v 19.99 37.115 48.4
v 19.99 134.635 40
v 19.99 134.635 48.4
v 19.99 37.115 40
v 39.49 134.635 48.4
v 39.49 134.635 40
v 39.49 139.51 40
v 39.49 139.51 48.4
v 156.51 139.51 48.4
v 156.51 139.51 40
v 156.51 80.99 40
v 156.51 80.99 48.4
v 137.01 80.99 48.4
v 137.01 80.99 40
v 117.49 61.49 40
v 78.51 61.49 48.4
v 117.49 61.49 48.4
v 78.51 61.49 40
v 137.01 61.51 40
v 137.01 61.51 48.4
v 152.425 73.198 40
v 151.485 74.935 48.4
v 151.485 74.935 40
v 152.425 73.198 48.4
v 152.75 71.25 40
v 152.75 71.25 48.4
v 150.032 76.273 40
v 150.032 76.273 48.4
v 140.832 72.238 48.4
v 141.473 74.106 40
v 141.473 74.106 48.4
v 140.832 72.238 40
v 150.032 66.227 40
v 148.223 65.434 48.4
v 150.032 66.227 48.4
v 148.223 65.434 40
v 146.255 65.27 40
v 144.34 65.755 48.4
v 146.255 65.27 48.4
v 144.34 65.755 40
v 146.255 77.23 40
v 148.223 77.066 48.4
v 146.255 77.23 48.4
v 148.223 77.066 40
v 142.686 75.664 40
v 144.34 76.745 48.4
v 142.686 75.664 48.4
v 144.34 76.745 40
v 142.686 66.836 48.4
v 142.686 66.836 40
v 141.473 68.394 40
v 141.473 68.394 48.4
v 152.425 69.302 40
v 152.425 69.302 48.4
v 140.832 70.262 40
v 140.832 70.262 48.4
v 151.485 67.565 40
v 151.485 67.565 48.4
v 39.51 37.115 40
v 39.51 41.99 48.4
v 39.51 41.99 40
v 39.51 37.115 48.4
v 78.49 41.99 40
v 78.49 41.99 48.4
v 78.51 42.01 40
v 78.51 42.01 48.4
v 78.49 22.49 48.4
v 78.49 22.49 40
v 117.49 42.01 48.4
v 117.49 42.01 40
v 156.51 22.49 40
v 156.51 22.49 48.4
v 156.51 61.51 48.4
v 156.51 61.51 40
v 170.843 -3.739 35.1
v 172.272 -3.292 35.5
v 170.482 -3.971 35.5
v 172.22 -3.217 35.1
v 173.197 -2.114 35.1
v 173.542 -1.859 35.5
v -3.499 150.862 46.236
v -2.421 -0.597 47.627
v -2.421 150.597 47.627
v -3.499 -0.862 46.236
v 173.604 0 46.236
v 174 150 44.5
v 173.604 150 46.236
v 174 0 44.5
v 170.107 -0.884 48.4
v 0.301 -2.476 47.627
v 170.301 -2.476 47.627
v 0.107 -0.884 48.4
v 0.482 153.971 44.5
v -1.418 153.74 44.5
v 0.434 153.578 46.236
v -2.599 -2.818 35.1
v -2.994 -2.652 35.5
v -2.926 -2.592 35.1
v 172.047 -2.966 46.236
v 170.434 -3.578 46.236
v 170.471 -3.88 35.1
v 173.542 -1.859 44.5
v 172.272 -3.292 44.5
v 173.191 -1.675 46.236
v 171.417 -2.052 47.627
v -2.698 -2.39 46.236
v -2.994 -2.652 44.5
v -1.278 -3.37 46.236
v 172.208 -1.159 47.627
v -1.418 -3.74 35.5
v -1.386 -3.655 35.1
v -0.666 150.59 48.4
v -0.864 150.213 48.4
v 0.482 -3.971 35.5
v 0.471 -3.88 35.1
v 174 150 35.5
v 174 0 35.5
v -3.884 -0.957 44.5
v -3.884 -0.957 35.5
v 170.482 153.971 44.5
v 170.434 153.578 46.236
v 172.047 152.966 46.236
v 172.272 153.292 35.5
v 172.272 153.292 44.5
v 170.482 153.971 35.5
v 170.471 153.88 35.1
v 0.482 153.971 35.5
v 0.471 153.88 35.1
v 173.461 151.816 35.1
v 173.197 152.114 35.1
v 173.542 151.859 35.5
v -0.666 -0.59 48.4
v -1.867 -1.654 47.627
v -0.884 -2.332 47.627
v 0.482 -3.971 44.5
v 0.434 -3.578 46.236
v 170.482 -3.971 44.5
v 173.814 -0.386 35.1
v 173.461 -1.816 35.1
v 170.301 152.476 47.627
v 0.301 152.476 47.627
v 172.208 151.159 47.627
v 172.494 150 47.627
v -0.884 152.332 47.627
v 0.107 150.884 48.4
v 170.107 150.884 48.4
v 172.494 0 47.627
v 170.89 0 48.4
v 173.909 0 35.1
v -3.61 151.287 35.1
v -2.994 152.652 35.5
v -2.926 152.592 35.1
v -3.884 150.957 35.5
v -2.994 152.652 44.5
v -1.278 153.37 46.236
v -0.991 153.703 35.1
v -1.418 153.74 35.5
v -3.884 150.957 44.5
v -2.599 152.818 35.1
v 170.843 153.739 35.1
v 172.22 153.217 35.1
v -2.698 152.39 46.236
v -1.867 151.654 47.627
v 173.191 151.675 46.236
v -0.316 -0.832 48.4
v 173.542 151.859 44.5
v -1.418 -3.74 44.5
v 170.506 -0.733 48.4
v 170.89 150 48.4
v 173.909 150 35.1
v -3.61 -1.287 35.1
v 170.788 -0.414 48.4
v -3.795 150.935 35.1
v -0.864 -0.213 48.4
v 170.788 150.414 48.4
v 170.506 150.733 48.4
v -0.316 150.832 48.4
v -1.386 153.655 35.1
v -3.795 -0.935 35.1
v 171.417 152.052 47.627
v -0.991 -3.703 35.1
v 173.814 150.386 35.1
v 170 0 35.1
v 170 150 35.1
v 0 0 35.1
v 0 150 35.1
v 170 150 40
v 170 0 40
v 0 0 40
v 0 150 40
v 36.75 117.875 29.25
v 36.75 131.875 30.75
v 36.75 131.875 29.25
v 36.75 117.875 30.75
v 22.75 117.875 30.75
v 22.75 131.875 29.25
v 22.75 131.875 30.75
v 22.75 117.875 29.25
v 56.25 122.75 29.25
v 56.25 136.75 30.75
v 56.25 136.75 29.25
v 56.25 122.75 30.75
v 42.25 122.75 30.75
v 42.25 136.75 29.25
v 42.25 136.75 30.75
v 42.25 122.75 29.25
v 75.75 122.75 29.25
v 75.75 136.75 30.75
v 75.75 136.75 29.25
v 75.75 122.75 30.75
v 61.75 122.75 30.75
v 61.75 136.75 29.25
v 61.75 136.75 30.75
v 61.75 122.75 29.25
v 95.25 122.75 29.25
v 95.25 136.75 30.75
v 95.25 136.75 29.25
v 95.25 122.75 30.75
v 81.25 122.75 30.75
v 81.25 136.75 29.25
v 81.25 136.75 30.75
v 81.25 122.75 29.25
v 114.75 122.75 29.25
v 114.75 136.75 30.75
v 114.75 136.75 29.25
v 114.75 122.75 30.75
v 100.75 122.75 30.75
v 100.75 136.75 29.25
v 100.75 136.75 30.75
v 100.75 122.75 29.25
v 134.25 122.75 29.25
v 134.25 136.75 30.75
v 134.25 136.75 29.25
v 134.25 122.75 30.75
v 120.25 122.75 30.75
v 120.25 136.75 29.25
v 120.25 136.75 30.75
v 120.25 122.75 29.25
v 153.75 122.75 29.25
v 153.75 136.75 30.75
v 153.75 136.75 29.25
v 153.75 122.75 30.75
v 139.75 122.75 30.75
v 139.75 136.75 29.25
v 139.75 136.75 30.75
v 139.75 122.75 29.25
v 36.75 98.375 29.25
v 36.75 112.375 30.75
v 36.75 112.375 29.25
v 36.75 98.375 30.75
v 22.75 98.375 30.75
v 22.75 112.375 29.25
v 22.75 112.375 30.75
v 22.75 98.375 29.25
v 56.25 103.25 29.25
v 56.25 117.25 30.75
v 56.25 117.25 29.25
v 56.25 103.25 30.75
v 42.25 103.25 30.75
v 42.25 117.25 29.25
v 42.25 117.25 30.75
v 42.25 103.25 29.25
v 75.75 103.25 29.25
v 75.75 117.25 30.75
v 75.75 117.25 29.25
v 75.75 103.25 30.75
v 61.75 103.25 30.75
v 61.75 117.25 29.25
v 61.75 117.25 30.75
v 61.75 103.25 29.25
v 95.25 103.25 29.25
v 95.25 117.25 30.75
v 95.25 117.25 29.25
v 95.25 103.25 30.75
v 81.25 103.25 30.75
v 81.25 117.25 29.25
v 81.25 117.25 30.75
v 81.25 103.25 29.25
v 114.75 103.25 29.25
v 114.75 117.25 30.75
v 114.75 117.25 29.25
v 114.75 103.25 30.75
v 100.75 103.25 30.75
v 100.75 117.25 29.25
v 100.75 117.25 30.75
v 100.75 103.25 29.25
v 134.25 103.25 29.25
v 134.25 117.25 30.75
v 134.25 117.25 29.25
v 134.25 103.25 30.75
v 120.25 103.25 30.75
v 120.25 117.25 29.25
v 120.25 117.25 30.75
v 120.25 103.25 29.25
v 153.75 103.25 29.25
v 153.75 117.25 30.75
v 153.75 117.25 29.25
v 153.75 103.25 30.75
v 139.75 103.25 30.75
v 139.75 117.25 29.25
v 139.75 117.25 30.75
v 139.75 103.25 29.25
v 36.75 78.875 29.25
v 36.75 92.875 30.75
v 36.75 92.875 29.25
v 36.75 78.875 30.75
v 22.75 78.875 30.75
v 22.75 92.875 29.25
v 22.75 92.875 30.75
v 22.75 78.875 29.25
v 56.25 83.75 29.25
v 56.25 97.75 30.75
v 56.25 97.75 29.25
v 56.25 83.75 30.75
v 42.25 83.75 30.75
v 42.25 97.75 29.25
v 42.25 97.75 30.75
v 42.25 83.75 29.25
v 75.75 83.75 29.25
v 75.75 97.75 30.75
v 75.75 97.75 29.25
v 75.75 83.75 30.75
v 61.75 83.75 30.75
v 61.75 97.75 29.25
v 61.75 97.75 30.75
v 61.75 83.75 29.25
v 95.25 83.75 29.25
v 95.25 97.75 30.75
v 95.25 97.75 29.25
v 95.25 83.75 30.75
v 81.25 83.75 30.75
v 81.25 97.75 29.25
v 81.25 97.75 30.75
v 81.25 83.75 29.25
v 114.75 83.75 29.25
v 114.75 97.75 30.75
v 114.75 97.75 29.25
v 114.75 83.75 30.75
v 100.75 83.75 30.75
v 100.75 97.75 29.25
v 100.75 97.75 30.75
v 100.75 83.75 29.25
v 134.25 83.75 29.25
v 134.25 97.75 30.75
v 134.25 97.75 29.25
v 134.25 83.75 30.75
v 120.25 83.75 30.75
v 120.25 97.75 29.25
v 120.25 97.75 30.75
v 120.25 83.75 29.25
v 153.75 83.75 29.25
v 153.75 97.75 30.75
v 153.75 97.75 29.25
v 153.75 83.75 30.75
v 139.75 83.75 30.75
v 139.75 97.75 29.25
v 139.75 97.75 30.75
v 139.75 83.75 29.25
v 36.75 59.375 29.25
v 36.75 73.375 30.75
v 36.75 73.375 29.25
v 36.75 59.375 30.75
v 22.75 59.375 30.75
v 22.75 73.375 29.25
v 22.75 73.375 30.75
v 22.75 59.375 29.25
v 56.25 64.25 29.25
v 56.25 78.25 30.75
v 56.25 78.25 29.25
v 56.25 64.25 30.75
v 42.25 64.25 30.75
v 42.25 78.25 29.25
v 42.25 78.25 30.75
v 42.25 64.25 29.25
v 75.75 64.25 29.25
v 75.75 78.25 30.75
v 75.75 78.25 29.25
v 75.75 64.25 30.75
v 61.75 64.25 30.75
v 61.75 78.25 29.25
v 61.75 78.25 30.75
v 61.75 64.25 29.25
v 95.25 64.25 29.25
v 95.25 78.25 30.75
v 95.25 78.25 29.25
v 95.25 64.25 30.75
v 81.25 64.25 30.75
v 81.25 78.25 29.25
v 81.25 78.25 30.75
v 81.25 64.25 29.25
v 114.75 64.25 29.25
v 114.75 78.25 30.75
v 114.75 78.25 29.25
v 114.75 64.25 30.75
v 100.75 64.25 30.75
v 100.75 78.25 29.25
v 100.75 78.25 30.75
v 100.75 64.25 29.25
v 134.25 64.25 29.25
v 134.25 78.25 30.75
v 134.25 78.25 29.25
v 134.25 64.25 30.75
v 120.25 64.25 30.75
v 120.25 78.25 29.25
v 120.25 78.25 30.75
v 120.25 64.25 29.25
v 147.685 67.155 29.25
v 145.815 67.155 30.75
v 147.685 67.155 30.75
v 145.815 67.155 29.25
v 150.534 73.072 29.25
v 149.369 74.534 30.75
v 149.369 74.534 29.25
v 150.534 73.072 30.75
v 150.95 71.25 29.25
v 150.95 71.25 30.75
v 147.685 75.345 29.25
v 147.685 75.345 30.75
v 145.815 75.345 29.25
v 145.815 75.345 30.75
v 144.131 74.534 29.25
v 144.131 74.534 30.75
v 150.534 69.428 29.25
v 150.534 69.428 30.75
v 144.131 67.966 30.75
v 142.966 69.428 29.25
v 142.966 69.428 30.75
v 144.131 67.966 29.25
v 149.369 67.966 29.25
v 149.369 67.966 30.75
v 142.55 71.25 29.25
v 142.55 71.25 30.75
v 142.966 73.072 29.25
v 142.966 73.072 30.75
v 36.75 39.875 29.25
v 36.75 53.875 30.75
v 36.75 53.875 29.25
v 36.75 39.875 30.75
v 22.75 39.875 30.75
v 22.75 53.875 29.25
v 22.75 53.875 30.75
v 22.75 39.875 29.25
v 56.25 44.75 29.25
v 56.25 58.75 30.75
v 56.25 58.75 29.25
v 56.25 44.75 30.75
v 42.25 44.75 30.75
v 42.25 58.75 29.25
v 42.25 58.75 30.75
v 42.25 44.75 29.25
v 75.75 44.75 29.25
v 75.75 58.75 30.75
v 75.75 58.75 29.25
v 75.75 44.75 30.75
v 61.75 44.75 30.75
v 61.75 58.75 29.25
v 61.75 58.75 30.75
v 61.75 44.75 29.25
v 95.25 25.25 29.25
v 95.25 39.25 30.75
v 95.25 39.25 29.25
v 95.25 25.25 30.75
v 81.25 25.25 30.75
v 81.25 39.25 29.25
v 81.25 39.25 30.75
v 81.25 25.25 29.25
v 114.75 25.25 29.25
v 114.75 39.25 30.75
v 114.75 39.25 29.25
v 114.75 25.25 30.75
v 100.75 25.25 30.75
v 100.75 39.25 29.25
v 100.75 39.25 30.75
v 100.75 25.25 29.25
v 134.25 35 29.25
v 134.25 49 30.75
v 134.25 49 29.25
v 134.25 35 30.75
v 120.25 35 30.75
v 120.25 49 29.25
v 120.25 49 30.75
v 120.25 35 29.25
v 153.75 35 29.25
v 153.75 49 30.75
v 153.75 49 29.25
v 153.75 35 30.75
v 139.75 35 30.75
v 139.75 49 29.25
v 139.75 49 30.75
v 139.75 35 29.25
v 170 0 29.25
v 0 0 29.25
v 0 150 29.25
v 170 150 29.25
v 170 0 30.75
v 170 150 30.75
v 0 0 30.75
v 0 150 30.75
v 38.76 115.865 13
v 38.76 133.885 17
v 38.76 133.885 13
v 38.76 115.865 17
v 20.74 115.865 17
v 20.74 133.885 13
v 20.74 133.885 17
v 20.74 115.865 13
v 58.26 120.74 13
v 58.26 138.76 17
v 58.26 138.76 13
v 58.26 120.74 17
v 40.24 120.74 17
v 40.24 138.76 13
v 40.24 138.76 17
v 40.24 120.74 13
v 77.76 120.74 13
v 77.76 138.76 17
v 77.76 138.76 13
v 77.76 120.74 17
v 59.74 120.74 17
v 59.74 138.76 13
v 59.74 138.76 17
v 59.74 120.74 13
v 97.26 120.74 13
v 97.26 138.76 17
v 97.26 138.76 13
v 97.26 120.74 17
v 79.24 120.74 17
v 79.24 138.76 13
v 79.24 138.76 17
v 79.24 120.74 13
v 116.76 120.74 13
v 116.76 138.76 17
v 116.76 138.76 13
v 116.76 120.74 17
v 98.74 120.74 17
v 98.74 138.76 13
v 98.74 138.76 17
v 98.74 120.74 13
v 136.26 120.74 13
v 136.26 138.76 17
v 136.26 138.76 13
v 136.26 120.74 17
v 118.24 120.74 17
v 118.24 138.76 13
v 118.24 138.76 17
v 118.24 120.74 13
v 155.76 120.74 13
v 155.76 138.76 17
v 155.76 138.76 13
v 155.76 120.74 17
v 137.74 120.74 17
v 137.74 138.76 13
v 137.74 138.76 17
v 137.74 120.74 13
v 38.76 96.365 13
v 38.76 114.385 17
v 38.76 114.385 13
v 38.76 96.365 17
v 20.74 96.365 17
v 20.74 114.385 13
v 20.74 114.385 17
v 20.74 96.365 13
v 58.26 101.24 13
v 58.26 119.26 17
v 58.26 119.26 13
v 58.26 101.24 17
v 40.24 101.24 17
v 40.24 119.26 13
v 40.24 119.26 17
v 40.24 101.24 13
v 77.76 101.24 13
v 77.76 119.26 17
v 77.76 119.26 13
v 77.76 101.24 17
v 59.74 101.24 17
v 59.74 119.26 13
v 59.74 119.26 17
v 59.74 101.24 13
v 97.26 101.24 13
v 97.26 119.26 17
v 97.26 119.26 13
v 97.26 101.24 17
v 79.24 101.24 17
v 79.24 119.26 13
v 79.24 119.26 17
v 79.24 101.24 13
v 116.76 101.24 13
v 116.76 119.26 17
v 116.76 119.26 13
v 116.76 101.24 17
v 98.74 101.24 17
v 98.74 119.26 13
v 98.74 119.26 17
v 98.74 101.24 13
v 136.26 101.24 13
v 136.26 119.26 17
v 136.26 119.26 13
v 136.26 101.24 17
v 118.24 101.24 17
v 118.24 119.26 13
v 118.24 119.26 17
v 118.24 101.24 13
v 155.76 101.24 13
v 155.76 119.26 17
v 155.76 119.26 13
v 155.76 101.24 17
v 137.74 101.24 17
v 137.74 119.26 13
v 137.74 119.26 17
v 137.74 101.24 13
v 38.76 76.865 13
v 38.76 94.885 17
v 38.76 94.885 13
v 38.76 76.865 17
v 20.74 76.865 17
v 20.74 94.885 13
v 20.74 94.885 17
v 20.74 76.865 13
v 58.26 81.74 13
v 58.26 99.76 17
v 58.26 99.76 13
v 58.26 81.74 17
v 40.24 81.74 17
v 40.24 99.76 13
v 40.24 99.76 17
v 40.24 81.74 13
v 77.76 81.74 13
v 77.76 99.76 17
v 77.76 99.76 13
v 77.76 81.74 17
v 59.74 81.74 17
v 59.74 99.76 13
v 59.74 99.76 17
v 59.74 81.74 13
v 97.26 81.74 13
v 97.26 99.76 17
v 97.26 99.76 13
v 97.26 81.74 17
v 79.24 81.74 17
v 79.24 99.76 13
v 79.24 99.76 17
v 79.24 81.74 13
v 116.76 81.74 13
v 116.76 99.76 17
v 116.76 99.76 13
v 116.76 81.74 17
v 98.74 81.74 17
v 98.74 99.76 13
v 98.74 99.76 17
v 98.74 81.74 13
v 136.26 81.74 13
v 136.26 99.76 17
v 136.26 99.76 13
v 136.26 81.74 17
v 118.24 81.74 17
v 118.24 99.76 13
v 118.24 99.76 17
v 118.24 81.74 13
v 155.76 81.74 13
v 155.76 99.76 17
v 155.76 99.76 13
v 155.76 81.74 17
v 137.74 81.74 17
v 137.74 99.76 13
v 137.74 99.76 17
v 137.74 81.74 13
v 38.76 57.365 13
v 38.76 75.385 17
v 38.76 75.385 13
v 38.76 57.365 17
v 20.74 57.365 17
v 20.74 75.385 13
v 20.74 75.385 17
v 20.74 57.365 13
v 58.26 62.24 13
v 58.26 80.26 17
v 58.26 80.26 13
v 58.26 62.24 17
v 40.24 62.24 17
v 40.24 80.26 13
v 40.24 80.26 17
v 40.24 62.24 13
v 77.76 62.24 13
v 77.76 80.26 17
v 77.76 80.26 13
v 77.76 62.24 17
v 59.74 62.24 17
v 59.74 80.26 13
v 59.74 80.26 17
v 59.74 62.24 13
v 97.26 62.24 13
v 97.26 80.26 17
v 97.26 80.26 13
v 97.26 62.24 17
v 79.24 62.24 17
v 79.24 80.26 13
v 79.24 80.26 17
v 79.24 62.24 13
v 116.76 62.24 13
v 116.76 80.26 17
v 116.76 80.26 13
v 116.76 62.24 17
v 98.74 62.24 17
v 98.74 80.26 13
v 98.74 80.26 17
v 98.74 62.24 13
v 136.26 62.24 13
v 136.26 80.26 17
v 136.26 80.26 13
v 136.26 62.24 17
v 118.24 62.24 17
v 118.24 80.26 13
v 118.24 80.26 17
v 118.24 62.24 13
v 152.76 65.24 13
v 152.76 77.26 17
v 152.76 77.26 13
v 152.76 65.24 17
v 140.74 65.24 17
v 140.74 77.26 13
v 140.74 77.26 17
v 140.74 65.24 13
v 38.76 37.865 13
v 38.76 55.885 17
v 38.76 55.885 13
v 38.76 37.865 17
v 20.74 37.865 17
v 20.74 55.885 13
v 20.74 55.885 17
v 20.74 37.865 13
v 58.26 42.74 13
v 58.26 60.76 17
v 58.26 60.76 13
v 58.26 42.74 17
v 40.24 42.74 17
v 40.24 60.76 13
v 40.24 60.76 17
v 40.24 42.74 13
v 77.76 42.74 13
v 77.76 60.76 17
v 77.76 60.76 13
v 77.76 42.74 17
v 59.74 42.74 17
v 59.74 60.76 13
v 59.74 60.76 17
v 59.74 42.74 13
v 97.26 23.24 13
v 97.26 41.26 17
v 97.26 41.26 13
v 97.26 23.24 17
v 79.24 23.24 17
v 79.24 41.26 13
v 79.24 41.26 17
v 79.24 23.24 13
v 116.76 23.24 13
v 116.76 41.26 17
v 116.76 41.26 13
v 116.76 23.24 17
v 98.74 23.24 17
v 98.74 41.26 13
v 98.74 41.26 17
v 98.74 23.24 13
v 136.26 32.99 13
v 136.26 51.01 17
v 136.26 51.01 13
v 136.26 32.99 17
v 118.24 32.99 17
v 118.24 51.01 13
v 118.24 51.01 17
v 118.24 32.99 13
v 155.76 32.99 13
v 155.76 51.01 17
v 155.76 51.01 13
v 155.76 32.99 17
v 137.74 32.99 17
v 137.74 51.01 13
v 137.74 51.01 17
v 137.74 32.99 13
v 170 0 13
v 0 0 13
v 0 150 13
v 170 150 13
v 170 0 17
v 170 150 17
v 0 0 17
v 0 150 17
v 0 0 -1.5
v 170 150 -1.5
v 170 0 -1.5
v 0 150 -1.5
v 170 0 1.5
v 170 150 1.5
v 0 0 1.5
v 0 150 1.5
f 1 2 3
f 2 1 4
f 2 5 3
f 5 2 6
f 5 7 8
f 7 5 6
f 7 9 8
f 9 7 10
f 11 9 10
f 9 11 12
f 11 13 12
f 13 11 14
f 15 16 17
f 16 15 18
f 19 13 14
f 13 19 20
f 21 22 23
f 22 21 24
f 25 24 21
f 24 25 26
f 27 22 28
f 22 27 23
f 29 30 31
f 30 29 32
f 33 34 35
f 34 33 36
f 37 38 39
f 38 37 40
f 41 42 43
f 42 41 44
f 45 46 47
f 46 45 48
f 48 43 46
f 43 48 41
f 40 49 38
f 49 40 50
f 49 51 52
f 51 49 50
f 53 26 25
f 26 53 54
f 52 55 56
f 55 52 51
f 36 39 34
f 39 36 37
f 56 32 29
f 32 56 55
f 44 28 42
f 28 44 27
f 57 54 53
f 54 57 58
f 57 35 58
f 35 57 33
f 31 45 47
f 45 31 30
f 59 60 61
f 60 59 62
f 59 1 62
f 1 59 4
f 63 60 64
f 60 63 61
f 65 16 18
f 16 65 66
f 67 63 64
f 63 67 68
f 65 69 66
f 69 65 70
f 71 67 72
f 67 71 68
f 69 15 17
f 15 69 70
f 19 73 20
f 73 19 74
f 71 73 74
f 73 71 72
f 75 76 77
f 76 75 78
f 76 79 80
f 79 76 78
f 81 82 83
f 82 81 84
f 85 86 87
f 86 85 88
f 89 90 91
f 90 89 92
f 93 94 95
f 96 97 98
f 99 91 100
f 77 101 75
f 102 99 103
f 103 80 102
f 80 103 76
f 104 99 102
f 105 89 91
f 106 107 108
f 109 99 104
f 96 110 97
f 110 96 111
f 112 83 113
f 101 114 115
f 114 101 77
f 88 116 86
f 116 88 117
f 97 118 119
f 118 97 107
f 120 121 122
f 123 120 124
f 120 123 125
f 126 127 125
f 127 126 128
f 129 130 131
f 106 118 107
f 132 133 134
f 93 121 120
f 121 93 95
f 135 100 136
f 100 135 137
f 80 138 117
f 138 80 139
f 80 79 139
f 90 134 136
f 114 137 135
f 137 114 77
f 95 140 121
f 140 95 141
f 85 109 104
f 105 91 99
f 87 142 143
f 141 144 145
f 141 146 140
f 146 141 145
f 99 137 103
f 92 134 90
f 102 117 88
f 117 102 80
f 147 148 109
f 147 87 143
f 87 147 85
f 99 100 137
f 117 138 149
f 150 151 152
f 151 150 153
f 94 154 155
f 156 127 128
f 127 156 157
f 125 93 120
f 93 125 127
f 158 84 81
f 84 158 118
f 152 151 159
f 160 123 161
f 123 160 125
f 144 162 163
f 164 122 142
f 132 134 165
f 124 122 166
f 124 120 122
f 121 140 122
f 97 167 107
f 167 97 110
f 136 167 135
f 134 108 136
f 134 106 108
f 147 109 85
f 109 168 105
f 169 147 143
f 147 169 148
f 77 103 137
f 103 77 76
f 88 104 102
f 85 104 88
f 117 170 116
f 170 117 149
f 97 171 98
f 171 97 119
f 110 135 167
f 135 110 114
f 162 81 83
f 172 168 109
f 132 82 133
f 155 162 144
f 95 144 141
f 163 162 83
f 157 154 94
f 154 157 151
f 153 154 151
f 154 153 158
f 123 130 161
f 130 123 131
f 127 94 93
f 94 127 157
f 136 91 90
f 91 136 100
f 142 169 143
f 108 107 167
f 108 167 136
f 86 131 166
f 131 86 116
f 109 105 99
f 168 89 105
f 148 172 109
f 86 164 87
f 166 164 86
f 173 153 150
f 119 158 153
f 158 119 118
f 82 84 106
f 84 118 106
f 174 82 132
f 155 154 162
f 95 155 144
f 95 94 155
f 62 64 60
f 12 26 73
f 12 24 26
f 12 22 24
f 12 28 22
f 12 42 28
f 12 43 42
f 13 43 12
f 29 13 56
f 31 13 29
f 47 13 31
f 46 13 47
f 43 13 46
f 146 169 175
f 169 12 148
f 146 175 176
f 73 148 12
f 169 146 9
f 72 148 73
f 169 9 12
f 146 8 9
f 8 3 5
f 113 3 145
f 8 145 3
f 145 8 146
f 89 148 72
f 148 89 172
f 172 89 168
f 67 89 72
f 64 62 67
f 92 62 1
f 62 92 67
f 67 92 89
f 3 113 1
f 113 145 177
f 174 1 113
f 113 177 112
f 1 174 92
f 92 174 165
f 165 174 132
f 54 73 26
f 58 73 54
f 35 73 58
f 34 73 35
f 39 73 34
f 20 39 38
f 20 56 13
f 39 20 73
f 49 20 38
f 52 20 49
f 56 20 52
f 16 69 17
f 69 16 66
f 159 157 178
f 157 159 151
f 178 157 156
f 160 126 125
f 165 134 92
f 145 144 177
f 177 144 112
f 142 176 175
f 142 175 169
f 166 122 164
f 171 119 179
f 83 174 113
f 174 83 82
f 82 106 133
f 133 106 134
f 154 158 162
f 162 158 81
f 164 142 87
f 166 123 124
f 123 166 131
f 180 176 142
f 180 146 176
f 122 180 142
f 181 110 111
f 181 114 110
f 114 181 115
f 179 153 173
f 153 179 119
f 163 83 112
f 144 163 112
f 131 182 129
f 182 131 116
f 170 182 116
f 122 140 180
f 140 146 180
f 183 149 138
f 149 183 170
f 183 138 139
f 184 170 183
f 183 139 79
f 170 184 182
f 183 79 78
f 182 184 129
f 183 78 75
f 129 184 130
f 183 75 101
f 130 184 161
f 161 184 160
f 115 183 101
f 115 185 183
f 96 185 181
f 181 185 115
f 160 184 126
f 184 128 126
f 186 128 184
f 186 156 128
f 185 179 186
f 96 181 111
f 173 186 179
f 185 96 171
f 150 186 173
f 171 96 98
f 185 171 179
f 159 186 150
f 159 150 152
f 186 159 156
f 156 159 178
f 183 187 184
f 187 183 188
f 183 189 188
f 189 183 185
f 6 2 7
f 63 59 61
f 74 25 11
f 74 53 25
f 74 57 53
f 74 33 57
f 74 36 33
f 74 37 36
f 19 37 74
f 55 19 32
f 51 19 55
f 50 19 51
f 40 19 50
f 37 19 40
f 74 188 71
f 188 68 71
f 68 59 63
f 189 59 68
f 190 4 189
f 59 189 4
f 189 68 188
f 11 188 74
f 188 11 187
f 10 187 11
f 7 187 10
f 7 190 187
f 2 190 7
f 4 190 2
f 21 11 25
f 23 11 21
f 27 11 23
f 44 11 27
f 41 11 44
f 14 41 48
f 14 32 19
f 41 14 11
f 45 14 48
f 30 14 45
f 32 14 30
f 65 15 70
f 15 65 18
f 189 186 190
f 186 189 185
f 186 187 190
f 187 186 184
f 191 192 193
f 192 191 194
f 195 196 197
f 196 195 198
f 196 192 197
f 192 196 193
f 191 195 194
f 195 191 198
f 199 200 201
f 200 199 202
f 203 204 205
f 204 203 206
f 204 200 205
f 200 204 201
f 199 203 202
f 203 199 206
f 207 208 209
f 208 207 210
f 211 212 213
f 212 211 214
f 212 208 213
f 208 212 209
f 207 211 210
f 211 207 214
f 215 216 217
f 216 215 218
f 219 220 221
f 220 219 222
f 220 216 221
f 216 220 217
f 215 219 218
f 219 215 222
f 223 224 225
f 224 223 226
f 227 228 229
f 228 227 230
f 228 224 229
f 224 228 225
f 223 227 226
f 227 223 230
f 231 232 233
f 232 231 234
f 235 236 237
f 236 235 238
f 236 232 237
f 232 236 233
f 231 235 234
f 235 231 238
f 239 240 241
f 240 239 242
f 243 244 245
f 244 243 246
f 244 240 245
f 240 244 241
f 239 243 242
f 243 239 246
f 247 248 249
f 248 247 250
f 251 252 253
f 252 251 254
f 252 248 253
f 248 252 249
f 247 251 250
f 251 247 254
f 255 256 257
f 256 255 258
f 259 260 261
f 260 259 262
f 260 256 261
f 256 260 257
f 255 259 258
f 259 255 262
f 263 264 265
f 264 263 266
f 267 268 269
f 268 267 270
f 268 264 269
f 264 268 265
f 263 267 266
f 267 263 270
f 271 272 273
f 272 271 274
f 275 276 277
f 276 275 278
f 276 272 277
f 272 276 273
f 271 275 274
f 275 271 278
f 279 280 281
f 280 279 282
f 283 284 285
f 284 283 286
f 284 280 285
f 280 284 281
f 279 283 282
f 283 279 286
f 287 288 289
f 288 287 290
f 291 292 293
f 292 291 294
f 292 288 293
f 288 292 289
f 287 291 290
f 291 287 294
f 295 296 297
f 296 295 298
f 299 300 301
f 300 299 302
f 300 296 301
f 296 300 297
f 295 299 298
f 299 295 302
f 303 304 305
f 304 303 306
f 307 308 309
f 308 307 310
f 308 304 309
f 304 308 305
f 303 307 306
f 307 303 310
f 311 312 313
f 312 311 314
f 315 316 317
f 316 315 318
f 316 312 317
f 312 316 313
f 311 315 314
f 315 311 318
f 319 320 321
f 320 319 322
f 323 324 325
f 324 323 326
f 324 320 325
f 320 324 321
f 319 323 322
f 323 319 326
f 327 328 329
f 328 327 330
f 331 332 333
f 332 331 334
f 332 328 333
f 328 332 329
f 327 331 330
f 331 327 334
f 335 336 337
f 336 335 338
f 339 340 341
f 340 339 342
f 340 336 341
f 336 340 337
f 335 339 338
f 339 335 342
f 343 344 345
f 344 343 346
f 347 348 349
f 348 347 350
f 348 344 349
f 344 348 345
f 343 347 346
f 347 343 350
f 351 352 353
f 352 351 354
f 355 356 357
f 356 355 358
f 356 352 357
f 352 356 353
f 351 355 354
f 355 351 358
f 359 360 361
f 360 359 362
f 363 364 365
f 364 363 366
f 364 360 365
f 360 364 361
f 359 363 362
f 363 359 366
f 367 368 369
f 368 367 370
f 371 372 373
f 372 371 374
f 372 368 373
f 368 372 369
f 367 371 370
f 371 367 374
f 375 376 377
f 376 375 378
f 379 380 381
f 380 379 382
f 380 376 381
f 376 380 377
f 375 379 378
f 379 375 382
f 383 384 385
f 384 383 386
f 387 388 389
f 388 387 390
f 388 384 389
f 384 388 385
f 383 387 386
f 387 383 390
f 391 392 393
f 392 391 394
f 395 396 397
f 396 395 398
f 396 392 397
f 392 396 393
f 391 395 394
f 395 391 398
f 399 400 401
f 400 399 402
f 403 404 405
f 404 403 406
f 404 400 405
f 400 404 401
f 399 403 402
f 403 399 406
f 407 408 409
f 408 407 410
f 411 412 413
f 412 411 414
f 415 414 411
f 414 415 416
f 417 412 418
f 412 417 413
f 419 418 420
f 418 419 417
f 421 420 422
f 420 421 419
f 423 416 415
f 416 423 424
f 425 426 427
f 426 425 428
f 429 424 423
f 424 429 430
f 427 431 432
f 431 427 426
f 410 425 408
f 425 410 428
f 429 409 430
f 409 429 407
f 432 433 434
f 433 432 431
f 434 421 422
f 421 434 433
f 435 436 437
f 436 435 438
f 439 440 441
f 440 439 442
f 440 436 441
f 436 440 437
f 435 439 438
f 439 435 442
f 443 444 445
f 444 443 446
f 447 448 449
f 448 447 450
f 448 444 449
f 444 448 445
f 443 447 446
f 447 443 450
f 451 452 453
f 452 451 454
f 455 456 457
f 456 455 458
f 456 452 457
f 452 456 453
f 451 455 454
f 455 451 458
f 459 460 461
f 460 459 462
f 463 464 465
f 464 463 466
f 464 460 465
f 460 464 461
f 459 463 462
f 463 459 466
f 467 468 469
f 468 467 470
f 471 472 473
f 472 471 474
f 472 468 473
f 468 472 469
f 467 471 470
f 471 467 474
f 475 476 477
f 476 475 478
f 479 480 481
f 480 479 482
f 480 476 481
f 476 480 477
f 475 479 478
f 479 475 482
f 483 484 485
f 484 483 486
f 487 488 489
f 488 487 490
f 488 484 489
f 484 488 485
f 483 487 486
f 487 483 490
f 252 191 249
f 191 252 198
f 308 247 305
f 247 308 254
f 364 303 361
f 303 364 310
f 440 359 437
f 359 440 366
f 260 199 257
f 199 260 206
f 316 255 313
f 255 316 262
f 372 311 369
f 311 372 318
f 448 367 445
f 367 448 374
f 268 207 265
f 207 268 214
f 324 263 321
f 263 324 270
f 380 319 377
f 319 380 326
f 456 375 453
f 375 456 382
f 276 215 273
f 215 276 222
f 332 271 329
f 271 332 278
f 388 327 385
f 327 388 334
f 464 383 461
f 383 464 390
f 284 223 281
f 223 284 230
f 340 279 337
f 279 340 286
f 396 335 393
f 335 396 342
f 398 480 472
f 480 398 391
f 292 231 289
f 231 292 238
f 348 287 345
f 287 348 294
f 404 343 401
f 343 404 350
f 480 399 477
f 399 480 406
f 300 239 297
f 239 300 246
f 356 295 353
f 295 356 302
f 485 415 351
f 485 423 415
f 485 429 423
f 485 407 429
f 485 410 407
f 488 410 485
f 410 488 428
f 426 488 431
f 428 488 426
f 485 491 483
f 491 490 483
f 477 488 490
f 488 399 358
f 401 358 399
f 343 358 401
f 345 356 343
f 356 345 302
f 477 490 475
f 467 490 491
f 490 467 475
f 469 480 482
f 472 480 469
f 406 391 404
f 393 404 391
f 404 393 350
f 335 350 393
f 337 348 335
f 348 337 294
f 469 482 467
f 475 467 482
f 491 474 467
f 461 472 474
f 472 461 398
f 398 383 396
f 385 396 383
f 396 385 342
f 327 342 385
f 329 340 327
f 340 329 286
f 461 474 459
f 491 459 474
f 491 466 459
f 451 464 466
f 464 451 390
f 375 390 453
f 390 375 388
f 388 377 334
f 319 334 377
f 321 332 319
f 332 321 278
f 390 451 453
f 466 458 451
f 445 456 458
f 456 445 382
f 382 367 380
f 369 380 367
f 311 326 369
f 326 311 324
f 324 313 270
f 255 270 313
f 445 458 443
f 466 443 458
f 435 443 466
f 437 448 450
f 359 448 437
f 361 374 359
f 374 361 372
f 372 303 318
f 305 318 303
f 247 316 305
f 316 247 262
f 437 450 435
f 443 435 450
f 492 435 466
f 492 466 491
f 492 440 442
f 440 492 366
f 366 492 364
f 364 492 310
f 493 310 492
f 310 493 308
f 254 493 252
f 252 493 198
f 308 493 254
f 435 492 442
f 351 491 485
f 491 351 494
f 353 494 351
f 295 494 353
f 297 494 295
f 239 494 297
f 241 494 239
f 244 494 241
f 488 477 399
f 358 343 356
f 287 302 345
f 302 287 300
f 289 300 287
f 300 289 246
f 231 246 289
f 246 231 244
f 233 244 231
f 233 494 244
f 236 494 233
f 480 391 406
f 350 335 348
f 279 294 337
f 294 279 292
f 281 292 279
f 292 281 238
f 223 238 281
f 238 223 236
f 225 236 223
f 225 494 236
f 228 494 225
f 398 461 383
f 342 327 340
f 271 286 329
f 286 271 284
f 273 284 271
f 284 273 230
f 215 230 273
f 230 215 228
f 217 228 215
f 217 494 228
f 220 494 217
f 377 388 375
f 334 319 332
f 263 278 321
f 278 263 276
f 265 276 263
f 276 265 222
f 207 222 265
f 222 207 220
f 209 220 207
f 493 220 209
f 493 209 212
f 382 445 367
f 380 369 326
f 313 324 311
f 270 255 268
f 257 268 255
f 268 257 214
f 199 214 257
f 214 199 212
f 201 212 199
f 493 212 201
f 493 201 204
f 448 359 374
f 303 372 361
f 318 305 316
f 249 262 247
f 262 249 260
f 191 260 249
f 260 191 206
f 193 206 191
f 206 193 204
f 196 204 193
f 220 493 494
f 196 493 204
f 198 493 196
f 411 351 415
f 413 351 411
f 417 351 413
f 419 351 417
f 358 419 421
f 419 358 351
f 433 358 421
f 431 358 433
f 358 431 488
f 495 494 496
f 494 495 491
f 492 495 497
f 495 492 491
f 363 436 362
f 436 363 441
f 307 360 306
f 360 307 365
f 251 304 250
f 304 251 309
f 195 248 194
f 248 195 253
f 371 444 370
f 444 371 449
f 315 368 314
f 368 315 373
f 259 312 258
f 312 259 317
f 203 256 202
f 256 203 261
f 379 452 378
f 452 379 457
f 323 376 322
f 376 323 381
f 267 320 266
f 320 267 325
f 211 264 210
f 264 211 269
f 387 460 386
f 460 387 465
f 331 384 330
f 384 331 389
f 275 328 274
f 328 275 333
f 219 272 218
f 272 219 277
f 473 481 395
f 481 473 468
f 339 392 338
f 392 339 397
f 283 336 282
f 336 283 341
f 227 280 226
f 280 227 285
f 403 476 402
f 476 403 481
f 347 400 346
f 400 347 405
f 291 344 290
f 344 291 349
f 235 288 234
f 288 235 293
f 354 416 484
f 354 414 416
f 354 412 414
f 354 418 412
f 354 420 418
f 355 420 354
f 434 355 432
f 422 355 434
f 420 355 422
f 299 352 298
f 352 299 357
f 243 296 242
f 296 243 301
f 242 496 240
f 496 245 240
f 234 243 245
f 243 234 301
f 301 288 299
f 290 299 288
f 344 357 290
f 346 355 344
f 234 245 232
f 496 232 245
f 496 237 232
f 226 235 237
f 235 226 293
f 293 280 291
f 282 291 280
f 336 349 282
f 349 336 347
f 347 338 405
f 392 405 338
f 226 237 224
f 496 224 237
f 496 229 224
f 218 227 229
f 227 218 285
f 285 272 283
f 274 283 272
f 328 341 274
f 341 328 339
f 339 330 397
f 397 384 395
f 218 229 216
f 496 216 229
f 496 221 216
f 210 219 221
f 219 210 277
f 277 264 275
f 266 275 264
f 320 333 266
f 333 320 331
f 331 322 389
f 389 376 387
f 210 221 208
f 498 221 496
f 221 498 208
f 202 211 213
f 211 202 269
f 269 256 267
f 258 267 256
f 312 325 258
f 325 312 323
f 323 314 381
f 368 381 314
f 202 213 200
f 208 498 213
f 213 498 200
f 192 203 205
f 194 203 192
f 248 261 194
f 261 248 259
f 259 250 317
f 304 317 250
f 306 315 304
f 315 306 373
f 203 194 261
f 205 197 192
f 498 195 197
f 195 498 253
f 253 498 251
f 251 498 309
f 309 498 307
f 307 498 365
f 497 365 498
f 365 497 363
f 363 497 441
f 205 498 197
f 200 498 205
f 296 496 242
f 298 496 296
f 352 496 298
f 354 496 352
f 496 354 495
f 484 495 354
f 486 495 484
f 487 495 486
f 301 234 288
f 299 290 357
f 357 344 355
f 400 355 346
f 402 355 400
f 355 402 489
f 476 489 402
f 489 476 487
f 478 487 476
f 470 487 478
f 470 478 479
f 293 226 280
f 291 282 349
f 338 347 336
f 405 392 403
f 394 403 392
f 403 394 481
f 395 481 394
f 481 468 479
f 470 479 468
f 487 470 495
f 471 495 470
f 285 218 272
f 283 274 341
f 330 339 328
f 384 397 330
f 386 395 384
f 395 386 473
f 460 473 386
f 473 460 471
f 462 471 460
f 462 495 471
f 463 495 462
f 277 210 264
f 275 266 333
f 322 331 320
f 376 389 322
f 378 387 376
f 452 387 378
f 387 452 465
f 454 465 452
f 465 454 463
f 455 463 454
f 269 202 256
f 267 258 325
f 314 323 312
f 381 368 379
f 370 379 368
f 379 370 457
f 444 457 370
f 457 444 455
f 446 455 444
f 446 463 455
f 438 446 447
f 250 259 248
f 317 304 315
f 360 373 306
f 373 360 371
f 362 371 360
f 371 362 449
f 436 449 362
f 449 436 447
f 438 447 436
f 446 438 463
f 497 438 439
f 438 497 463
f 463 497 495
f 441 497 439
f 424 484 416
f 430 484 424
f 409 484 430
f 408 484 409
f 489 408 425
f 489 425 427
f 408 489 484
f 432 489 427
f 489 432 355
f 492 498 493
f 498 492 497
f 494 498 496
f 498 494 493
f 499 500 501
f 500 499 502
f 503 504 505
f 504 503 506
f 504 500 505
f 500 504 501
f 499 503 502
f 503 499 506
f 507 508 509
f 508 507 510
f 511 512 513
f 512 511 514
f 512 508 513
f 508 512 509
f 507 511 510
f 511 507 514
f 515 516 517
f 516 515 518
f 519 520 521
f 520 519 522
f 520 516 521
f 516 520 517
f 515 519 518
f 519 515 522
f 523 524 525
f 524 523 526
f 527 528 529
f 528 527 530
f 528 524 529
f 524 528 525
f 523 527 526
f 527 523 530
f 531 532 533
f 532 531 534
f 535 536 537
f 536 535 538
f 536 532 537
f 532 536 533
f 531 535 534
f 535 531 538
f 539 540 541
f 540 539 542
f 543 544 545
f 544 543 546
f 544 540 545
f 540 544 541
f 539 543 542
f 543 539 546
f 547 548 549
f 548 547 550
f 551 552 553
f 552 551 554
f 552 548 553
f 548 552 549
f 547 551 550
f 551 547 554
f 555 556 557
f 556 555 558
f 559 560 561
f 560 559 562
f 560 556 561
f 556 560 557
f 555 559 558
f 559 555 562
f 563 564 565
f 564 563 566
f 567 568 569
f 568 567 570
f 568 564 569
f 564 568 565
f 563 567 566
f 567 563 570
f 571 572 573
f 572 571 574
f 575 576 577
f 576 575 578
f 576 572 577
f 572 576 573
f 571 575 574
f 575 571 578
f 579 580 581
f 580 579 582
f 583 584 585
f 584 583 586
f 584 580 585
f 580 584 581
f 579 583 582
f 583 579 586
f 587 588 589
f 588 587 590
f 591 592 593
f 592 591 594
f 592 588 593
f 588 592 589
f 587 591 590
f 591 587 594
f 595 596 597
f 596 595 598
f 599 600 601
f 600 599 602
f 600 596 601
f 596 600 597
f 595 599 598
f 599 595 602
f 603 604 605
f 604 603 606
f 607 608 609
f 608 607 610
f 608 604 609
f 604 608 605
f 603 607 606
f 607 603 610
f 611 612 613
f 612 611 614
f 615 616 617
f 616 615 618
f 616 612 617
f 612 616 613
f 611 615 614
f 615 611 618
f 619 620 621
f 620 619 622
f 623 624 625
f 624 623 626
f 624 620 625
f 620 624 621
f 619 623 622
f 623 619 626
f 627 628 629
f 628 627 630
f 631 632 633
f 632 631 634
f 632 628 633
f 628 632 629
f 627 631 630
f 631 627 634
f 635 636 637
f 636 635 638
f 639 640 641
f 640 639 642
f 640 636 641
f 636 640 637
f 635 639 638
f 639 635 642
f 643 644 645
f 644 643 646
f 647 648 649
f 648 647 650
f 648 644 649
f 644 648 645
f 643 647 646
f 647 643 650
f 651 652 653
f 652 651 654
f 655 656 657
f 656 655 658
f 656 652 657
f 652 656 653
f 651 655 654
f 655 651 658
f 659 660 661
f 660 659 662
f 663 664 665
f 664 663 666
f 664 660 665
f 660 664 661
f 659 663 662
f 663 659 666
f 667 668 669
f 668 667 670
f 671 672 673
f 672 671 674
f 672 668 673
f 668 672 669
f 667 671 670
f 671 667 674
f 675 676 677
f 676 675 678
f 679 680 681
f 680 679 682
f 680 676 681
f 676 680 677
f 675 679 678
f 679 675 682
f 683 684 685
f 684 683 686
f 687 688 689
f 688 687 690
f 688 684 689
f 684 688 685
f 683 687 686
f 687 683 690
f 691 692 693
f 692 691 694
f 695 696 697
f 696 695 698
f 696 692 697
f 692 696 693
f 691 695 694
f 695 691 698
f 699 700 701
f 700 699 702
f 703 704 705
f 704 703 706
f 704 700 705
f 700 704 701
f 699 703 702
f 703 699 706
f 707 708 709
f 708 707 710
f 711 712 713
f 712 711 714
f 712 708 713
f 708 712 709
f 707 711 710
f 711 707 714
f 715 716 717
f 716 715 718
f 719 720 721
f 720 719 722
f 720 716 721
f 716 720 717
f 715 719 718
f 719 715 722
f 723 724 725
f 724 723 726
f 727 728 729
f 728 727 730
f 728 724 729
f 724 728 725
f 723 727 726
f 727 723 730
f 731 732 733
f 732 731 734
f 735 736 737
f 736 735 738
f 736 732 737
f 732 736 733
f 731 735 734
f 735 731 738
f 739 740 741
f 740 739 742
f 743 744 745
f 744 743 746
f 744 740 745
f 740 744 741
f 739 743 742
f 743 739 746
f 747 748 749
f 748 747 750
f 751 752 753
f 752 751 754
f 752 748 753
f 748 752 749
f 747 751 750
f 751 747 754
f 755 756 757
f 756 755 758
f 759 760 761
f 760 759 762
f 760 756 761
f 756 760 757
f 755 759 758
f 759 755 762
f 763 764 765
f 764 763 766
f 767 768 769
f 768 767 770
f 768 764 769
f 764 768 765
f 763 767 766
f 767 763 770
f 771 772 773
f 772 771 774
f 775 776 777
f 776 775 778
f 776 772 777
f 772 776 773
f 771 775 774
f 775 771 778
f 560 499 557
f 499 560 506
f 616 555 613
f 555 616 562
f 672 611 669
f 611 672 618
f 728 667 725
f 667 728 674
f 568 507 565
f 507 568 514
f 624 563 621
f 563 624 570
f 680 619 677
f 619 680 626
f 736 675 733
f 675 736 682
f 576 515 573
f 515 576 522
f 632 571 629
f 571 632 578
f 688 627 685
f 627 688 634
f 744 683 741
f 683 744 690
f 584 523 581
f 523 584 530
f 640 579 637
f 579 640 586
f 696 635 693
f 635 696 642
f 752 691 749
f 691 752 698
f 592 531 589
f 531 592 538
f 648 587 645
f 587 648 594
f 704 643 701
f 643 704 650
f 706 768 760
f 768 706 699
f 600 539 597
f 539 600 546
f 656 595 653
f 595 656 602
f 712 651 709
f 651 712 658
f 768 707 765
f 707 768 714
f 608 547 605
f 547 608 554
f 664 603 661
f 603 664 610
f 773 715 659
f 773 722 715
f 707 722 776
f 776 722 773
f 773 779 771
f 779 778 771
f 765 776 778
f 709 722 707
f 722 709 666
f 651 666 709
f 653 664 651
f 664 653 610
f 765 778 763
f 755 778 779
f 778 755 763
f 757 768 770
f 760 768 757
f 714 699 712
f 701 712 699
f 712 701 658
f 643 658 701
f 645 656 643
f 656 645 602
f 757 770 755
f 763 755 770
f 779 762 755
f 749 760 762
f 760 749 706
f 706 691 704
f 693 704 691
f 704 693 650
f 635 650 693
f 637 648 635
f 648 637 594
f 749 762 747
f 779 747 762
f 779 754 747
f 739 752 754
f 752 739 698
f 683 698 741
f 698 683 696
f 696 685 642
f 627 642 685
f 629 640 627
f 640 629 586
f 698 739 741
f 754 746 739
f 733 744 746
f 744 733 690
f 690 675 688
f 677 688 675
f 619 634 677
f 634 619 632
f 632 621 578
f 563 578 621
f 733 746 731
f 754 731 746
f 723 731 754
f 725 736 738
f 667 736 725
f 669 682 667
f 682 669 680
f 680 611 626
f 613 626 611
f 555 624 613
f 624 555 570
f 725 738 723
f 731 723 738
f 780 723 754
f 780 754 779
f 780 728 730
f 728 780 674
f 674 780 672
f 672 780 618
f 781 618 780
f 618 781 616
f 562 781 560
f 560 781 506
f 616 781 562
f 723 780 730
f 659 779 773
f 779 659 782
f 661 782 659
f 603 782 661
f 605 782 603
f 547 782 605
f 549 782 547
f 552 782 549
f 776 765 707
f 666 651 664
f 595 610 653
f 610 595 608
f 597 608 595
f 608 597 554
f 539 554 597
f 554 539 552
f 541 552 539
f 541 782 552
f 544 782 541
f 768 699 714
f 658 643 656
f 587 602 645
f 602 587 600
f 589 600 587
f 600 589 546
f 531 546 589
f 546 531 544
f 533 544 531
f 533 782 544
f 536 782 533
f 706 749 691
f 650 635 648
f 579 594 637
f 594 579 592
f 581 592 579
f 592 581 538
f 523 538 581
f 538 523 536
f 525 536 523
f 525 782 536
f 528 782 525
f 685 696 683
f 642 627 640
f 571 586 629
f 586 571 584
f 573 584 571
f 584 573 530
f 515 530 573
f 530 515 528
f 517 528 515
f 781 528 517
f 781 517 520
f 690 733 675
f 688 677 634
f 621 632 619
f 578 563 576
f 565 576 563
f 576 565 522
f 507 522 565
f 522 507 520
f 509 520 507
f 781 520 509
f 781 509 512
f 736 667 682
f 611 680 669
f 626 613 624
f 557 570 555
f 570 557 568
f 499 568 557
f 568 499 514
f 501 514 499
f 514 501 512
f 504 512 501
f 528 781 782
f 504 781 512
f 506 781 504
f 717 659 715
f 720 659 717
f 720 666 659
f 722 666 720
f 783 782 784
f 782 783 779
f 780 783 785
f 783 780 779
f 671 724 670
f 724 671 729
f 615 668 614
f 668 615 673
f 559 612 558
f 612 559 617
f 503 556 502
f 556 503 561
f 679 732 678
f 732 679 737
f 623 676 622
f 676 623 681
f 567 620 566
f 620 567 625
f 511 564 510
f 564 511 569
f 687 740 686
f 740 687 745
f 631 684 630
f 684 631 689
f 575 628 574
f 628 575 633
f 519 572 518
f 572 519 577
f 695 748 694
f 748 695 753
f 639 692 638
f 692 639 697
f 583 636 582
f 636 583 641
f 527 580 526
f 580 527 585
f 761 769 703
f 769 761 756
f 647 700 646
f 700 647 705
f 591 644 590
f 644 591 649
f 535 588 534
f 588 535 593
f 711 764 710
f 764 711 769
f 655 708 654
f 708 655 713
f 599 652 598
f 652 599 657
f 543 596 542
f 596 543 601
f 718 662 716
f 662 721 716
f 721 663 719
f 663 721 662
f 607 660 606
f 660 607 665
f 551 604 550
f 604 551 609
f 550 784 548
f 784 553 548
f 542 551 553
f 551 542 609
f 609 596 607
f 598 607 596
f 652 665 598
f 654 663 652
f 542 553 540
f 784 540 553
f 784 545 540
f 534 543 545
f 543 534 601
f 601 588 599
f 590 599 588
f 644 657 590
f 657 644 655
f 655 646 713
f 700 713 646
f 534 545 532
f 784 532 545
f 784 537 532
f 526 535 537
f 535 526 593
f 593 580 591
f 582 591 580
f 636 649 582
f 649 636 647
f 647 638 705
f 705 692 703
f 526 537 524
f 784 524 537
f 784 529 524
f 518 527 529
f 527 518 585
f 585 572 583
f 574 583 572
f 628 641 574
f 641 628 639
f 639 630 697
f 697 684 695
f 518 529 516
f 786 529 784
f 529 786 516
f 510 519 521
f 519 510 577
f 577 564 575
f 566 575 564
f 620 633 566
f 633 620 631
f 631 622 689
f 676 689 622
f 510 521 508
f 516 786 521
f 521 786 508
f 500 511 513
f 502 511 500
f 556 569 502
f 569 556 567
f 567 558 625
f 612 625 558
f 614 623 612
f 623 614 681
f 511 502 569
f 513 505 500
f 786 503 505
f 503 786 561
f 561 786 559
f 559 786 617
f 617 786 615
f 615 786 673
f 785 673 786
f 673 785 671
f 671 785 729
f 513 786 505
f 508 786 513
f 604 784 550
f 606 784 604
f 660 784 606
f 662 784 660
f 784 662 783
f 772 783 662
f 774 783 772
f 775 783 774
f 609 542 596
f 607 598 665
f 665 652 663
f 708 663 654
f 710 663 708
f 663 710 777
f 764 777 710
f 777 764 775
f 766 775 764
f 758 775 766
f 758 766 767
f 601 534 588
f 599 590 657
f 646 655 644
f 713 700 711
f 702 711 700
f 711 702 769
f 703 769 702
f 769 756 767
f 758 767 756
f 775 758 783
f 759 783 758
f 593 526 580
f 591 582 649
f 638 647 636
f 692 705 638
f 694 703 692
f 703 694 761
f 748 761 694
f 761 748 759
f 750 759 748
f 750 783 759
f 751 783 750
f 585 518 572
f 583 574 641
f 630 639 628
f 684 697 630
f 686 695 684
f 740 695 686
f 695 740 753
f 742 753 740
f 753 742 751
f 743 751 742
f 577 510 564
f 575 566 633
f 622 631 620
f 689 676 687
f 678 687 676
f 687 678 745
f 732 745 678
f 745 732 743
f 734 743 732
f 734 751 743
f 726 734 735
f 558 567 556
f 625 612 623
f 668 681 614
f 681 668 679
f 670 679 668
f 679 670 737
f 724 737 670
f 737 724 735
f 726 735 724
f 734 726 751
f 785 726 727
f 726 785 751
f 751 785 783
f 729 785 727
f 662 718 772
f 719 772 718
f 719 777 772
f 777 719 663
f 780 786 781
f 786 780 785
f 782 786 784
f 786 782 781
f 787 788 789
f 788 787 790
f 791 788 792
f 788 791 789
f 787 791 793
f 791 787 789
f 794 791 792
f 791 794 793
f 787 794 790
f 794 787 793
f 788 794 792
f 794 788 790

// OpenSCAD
// rows contain columns in vectors
layout = [
  [[1,1,0,.25,0,false], [1,1,0,0,0,false], [1,1,0,0,0,false], [1,1,0,0,0,false], [1,1,0,0,0,false], [1,1,0,0,0,false], [1,1,0,0,0,false]],

  [[1,1,0,.25,0,false], [1,1,0,0,0,false], [1,1,0,0,0,false], [1,1,0,0,0,false], [1,1,0,0,0,false], [1,1,0,0,0,false], [1,1,0,0,0,false]],

  [[1,1,0,.25,0,false], [1,1,0,0,0,false], [1,1,0,0,0,false], [1,1,0,0,0,false], [1,1,0,0,0,false], [1,1,0,0,0,false], [1,1,0,0,0,false]],

  [[1,1,0,.25,0,false], [1,1,0,0,0,false], [1,1,0,0,0,false], [1,1,0,0,0,false], [1,1,0,0,0,false], [1,1,0,0,0,false], [1,1,0,0,0,true]],

  [[1,1,0,.25,0,false], [1,1,0,0,0,false], [1,1,0,0,0,false], [1,1,0,1,0,false], [1,1,0,1,0,false], [1,2,0,0,0,false], [1,2,0,0,0,false]],
];


module hole_cutouts(keys=layout, space=19.5, holesize=14, encoder=8.4){
  module stab_hole(){
    
}
 for(row=[0:len(keys)-1]) {
   for(col=[0:len(keys[row])-1])
     {
       let(
	   k=keys[row][col],
	   xsize=space*k[0],
	   xpos=(space*col)+(((k[0])-1)*space)+(k[2]*space),
	   ysize=space*k[1],
	   ypos=(space*row)+(((k[1])-1)*space)+(k[3]*space),
	   rotation=k[4],
	   isencoder=k[5]
	   )
	 {
	    translate([xpos,-ypos,0]){
	      if(!isencoder) 
		{
		  if(k[0]==2)
		    {
		      translate([xsize/2,ysize/2,0]) cube([holesize,holesize,25], center=true);
		    }
		      translate([xsize/2,ysize/2,0]) cube([holesize,holesize,25], center=true);
		}
	      else translate([xsize/2,ysize/2,0]) cylinder(h=25, d=encoder, center=true);
	    }
	 }
     }
 } 
}
// hole_cutouts();

module keycap_cutouts(keys=layout, delta=0.02, space=19.5, encoder=12){
  for(row=[0:len(keys)-1]) {
   for(col=[0:len(keys[row])-1])
     {
       let(
	   k=keys[row][col],
	   xsize=space*k[0],
	   xpos=(space*col)+(((k[0])-1)*space)+(k[2]*space),
	   ysize=space*k[1],
	   ypos=(space*row)+(((k[1])-1)*space)+(k[3]*space),
	   rotation=k[4],
	   isencoder=k[5]
	   )
	 {
	    translate([xpos,-ypos,0]){
	      if(!isencoder) translate([xsize/2,ysize/2,0]) cube([xsize+delta,ysize+delta,25], center=true);
	      else translate([xsize/2,ysize/2,0]) cylinder(h=25, d=encoder, center=true);
	    }
	 }
     }
 }  
}
// translate([200,0,0]) keycap_cutouts();


module gasket_holes(keys=layout, delta=0.02,space=19.5, holesize=18, encoder=12){
   for(row=[0:len(keys)-1]) {
   for(col=[0:len(keys[row])-1])
     {
       let(
	   k=keys[row][col],
	   xsize=space*k[0],
	   xpos=(space*col)+(((k[0])-1)*space)+(k[2]*space),
	   ysize=space*k[1],
	   ypos=(space*row)+(((k[1])-1)*space)+(k[3]*space),
	   rotation=k[4],
	   isencoder=k[5]
	   )
	 {
	    translate([xpos,-ypos,0]){
	      if(!isencoder) translate([xsize/2,ysize/2,0]) cube([holesize+delta, holesize+delta,8], center=true);
	      else translate([xsize/2,ysize/2,0]) cube([encoder+delta,encoder+delta,8], center=true);
	    }
	 }
     }
 }
}
// gasket_holes();

points =[
	 [0,0],
	 [0,150],
	 [170,150],
	 [170,0]
];

module top_assembly(
		    polygon_points=points,
		    keys=layout,
		    top_plate_height=9,
		    top_plate_offset=[0,0,40],
		    key_plate_height=1.5,
		    key_plate_depth=1,
		    key_plate_offset=[0,0,30],
		    gasket_height=4,
		    gasket_plate_offset=[0,0,15],
		    bottom_plate_height=3,
		    bottom_plate_offset=[0,0,0],
		    plate_layer_allign=[20,120,0],
		    top=true,
		    plate=true,
		    gasket=true,
		    bottom_plate=true
		    )
{
  module shape(p=polygon_points, h)
  {
   	linear_extrude(height=h, center = true, convexity = 10, twist = 0, slices = 20, scale = 1.0) polygon(p);
  }

  module top_plate(
		   clearance=(key_plate_height+gasket_height+bottom_plate_height)*2,
		   pos_offset=top_plate_offset
		   )
    {
    translate(pos_offset) difference() {
      minkowski() {
	shape(h=top_plate_height);
	sphere(4);
      }
      translate([0,0,-9.9]) cube([500,500,10],center=true);
      translate([0,0,-(clearance/2)]) shape(h=clearance);
      translate([20,120,0]) keycap_cutouts(keys = layout, delta = 0.02, space = 19.5, encoder = 12);
    }
  }

  module key_plate(pos_offset=key_plate_offset)
  {
    translate(pos_offset) difference()
      {
	shape(h=key_plate_height);
	translate(plate_layer_allign) hole_cutouts();
      }    
  }
  
  module gasket(pos_offset=gasket_plate_offset)
    {
      translate(pos_offset) difference()
	{
	 color("grey") shape(h=gasket_height);
	  translate(plate_layer_allign) gasket_holes();
	}
    }
  
  module bottom_plate(pos_offset=bottom_plate_offset)
  {
    translate(pos_offset) shape(h=bottom_plate_height);
  }
 
  if(top) top_plate();
  if(plate) key_plate();
  if(gasket) gasket();
  if(bottom_plate) bottom_plate();
}

top_assembly();
